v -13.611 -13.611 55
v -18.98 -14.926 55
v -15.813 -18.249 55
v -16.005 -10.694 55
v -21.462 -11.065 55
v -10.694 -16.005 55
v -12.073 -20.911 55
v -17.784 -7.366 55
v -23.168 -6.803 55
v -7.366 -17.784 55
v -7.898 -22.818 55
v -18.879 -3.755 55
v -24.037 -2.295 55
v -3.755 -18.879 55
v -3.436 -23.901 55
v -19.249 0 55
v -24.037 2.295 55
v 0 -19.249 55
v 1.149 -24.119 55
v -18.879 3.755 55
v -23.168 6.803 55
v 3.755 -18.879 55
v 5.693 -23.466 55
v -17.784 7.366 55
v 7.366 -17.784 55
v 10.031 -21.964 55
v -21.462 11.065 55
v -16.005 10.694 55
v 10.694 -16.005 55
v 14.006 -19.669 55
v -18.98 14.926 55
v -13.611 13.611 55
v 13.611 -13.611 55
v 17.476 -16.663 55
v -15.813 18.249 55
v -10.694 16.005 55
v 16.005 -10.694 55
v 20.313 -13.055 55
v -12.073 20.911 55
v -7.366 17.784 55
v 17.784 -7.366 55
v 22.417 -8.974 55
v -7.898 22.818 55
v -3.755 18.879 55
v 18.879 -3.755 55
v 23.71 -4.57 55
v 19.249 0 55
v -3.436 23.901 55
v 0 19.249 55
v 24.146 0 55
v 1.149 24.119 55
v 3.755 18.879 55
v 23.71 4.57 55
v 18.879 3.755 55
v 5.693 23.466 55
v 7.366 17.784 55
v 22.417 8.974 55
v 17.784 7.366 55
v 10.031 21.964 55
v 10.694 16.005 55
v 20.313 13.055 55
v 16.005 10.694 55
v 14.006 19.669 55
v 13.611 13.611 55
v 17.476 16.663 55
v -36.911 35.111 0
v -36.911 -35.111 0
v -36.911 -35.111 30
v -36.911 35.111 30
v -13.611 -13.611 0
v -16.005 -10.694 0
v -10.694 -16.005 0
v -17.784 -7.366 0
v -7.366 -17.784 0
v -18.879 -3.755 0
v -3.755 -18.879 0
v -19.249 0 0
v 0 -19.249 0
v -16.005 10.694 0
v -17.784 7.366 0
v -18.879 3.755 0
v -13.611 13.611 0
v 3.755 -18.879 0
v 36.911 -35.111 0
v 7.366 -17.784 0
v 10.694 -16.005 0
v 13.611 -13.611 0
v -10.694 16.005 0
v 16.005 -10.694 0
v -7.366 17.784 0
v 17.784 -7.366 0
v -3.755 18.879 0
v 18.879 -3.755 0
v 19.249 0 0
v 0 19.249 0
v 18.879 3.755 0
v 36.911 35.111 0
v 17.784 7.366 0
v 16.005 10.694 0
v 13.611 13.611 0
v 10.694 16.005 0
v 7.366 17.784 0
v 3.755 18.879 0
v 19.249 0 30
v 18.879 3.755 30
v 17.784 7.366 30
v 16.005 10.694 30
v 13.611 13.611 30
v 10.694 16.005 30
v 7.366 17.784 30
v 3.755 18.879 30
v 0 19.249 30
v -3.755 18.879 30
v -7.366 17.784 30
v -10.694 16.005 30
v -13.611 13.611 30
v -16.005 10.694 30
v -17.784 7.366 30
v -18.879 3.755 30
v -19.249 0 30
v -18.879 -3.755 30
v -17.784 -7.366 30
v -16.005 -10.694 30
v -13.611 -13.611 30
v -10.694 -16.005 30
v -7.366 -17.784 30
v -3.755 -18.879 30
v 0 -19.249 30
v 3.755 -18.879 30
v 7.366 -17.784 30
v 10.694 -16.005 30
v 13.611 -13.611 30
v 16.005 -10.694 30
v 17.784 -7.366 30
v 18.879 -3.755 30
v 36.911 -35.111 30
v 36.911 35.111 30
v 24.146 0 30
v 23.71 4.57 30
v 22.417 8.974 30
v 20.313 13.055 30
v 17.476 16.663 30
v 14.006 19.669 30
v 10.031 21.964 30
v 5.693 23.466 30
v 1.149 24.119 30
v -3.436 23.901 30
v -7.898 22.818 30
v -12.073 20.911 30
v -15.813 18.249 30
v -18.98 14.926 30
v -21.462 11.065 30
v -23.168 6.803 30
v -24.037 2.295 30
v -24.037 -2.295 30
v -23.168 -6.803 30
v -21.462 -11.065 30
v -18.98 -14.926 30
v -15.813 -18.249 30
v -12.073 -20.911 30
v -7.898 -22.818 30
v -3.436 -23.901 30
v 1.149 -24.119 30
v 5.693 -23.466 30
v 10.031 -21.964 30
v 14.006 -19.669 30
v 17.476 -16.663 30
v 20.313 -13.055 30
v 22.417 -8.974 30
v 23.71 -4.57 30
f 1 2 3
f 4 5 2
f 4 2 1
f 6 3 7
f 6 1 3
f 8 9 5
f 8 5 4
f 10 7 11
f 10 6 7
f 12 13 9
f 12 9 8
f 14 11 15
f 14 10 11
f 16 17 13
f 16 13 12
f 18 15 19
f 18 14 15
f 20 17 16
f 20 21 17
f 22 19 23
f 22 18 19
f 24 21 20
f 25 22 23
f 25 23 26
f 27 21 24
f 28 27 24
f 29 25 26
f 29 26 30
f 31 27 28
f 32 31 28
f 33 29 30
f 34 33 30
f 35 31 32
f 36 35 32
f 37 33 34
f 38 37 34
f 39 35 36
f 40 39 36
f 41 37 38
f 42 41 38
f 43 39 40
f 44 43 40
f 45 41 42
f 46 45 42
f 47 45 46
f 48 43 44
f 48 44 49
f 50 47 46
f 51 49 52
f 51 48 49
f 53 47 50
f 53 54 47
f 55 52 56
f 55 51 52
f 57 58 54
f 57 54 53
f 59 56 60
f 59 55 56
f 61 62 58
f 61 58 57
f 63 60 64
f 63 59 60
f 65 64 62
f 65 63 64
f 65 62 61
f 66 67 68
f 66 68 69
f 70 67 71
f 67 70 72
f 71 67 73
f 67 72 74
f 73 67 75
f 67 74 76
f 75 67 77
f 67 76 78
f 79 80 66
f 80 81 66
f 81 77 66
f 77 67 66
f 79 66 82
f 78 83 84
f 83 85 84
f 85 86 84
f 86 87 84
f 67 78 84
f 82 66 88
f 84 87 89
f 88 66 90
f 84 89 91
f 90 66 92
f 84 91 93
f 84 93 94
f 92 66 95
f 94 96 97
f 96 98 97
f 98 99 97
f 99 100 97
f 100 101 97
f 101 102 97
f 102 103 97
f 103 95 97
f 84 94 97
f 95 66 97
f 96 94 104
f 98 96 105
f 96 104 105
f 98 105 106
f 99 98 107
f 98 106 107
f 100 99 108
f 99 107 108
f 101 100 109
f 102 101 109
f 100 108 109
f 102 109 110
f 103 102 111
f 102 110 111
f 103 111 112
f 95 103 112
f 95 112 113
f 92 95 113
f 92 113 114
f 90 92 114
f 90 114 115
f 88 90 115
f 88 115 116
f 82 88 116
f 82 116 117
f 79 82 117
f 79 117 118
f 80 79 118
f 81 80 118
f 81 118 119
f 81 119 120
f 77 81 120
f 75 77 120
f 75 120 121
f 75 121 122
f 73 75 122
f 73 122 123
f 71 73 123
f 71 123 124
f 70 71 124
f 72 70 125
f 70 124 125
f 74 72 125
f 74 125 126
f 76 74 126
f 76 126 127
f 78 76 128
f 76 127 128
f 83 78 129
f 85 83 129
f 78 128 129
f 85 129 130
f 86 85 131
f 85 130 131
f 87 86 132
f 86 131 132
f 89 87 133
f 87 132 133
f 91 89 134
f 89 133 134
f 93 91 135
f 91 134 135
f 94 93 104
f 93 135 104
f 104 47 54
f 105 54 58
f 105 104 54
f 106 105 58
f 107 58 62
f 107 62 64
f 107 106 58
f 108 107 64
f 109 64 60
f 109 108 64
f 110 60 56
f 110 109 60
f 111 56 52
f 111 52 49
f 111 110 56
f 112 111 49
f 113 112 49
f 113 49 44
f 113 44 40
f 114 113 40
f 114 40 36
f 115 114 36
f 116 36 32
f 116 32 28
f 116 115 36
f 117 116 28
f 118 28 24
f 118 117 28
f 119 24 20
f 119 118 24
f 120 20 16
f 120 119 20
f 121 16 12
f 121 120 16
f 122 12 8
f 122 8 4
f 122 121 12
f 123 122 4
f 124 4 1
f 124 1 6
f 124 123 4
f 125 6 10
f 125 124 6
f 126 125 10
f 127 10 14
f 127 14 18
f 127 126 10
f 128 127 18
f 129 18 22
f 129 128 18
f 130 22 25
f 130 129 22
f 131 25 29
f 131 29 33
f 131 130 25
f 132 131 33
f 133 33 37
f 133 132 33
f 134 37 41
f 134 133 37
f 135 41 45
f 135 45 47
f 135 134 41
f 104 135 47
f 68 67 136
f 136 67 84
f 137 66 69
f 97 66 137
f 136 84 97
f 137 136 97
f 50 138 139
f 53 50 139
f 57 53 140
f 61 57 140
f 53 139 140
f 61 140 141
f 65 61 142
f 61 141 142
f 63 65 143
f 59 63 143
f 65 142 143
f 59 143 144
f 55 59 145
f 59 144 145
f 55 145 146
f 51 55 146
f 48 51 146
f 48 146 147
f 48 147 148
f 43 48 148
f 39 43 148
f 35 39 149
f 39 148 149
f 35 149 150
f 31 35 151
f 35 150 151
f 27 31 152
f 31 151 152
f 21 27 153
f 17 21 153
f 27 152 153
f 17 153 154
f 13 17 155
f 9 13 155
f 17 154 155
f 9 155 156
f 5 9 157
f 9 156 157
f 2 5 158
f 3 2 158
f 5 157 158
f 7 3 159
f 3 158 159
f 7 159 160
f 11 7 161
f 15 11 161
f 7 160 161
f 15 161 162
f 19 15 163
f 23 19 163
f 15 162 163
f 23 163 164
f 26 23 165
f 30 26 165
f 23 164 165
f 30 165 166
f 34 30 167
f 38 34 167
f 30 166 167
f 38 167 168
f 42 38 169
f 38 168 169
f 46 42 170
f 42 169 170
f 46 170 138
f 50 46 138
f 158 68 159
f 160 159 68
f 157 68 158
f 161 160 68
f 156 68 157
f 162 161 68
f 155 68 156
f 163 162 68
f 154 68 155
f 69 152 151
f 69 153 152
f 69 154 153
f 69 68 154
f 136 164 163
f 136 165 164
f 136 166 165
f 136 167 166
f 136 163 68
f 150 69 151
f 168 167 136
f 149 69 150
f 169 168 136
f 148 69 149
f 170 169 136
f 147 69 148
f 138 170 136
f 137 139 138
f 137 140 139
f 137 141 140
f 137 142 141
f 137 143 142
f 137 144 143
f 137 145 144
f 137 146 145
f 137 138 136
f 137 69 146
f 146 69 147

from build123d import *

# Parameters (mm, degrees)
F0_W     = 73.822246
F0_H     = 70.221156
F1_DEPTH = 30
F2_R     = 19.249212
F3_DEPTH = 30.001
F4_R     = 24.146454
F4_R_2   = 19.249212
F5_DEPTH = 25


with BuildPart() as f1:
    # F0 (on Top) → F1 (new body)
    with BuildSketch(Plane.XY):
        Rectangle(F0_W, F0_H)
    extrude(amount=F1_DEPTH)

    # F2 (on face) → F3 (cut, through all)
    with BuildSketch(Plane.XY.offset(30)):
        Circle(F2_R)
    extrude(amount=-F3_DEPTH, mode=Mode.SUBTRACT)

    # F4 (on face) → F5 (join)
    with BuildSketch(Plane.XY.offset(30)):
        Circle(F4_R)
        Circle(F4_R_2, mode=Mode.SUBTRACT)
    extrude(amount=F5_DEPTH)


solid = f1.part
